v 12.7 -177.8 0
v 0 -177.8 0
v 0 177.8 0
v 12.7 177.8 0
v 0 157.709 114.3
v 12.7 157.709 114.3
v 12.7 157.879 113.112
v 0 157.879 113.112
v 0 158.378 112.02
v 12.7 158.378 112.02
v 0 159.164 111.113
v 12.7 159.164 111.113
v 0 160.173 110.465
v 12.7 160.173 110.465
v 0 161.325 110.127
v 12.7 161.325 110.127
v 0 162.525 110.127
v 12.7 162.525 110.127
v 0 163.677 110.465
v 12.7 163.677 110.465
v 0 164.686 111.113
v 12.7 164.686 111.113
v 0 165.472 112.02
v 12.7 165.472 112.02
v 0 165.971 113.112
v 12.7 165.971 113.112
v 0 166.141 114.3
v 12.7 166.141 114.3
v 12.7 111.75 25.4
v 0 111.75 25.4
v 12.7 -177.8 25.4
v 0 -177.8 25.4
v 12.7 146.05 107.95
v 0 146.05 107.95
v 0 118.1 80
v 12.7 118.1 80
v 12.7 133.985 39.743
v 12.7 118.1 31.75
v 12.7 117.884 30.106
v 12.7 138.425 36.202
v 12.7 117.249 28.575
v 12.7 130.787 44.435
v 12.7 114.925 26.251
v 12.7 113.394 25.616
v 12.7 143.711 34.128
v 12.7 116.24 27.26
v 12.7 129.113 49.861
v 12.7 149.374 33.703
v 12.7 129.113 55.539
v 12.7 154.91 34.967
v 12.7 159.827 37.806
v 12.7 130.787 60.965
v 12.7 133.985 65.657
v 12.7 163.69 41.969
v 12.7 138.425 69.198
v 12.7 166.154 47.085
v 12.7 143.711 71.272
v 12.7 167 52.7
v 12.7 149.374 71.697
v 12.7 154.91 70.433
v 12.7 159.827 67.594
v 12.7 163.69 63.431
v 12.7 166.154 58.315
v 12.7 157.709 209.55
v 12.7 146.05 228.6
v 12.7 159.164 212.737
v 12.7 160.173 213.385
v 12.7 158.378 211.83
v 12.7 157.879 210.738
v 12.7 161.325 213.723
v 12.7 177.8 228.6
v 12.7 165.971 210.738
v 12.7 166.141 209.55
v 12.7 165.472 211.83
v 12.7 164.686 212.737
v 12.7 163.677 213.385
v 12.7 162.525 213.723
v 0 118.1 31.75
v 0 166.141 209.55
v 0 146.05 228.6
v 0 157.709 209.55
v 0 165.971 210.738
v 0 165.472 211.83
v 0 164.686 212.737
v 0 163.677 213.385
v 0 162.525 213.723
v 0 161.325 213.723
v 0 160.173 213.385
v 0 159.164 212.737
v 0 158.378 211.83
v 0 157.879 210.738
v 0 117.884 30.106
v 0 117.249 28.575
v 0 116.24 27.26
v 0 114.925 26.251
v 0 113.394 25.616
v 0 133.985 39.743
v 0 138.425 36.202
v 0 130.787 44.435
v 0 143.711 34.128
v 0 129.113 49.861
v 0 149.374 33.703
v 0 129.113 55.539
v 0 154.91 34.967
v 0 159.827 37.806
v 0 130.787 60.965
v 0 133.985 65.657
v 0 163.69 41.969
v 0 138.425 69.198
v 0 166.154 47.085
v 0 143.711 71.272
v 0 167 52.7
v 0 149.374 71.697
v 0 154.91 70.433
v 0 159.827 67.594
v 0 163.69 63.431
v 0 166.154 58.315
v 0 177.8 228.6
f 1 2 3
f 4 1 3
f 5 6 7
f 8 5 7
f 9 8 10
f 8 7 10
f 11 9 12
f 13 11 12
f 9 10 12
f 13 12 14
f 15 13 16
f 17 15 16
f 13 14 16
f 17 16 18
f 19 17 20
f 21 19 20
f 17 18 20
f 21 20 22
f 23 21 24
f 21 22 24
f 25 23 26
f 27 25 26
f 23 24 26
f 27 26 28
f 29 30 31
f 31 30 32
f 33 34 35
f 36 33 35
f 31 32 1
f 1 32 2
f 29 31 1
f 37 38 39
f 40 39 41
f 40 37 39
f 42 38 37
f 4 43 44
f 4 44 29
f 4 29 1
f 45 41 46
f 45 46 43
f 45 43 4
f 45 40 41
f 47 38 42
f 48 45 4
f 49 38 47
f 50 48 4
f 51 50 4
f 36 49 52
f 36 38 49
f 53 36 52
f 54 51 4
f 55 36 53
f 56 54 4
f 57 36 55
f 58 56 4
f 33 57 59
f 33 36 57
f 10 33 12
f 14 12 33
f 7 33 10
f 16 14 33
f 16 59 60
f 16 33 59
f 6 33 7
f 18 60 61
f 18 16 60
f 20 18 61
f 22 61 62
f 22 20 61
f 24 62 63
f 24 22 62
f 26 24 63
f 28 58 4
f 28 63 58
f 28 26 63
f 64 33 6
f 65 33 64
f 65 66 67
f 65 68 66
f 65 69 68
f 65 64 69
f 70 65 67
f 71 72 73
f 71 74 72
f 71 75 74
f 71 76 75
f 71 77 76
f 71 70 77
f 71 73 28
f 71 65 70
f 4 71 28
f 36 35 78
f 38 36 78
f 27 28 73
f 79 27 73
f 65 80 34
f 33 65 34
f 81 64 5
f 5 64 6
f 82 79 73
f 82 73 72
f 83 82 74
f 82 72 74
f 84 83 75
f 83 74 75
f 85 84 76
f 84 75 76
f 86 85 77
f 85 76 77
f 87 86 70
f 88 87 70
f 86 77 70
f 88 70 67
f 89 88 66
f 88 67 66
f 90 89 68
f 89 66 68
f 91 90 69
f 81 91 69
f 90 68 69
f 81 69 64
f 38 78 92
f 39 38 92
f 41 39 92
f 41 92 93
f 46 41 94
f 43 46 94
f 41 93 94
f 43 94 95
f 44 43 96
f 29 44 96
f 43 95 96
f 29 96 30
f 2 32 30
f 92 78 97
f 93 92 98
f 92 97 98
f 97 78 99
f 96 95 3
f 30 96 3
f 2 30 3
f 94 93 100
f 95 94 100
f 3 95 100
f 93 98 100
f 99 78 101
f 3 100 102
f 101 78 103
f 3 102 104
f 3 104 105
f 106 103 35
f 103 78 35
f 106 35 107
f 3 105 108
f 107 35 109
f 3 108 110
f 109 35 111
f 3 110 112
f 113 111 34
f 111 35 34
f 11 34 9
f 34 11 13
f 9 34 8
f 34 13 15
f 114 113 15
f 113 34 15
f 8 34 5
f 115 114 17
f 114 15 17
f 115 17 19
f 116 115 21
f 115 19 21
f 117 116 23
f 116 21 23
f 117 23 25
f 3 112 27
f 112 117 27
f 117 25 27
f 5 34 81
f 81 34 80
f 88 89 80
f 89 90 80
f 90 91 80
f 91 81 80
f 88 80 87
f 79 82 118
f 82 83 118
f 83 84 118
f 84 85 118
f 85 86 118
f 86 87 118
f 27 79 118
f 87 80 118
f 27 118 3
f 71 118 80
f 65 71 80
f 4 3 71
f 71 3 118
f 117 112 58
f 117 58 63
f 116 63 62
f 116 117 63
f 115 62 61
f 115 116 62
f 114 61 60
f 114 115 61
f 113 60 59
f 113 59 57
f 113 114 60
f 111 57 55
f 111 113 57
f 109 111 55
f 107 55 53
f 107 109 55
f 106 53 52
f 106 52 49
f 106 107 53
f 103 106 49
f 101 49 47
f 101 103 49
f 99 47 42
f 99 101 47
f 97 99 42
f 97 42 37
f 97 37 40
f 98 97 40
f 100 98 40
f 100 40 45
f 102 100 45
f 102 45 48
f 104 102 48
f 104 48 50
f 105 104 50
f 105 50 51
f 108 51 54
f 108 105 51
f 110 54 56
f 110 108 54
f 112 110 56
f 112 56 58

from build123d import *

# Parameters (mm, degrees)
F0_R     = 19.05
F1_DEPTH = 12.7
F3_DEPTH = 12.701


# Not quite as in the source:
# - a feature names something its author has since deleted; it is built from what else it names


with BuildPart() as f1:
    # F0 (on Right) → F1 (new body)
    with BuildSketch(Plane.YZ):
        with BuildLine():
            Line((111.75, 25.4), (-177.8, 25.4))
            Line((-177.8, 25.4), (-177.8, 0))
            Line((-177.8, 0), (146.05, 0))
            Line((146.05, 0), (177.8, 0))
            Line((177.8, 0), (177.8, 25.4))
            Line((177.8, 25.4), (177.8, 228.6))
            Line((177.8, 228.6), (146.05, 228.6))
            Line((146.05, 228.6), (146.05, 107.95))
            Line((146.05, 107.95), (118.1, 80))
            Line((118.1, 80), (118.1, 31.75))
            ThreePointArc((118.1, 31.75), (116.2401280605, 27.2598719395), (111.75, 25.4))
        make_face()
        with Locations((147.9499962, 52.7)):
            Circle(F0_R, mode=Mode.SUBTRACT)
    extrude(amount=F1_DEPTH)

    # F2 (on face) → F3 (cut, through all)
    with BuildSketch(Plane.YZ.offset(12.7)):
        with BuildLine():
            ThreePointArc((166.1414, 209.55), (161.925, 213.7664), (157.7086, 209.55))
            Line((157.7086, 209.55), (157.7086, 114.3))
            ThreePointArc((157.7086, 114.3), (161.925, 110.0836), (166.1414, 114.3))
            Line((166.1414, 114.3), (166.1414, 209.55))
        make_face()
    extrude(amount=-F3_DEPTH, mode=Mode.SUBTRACT)


solid = f1.part
